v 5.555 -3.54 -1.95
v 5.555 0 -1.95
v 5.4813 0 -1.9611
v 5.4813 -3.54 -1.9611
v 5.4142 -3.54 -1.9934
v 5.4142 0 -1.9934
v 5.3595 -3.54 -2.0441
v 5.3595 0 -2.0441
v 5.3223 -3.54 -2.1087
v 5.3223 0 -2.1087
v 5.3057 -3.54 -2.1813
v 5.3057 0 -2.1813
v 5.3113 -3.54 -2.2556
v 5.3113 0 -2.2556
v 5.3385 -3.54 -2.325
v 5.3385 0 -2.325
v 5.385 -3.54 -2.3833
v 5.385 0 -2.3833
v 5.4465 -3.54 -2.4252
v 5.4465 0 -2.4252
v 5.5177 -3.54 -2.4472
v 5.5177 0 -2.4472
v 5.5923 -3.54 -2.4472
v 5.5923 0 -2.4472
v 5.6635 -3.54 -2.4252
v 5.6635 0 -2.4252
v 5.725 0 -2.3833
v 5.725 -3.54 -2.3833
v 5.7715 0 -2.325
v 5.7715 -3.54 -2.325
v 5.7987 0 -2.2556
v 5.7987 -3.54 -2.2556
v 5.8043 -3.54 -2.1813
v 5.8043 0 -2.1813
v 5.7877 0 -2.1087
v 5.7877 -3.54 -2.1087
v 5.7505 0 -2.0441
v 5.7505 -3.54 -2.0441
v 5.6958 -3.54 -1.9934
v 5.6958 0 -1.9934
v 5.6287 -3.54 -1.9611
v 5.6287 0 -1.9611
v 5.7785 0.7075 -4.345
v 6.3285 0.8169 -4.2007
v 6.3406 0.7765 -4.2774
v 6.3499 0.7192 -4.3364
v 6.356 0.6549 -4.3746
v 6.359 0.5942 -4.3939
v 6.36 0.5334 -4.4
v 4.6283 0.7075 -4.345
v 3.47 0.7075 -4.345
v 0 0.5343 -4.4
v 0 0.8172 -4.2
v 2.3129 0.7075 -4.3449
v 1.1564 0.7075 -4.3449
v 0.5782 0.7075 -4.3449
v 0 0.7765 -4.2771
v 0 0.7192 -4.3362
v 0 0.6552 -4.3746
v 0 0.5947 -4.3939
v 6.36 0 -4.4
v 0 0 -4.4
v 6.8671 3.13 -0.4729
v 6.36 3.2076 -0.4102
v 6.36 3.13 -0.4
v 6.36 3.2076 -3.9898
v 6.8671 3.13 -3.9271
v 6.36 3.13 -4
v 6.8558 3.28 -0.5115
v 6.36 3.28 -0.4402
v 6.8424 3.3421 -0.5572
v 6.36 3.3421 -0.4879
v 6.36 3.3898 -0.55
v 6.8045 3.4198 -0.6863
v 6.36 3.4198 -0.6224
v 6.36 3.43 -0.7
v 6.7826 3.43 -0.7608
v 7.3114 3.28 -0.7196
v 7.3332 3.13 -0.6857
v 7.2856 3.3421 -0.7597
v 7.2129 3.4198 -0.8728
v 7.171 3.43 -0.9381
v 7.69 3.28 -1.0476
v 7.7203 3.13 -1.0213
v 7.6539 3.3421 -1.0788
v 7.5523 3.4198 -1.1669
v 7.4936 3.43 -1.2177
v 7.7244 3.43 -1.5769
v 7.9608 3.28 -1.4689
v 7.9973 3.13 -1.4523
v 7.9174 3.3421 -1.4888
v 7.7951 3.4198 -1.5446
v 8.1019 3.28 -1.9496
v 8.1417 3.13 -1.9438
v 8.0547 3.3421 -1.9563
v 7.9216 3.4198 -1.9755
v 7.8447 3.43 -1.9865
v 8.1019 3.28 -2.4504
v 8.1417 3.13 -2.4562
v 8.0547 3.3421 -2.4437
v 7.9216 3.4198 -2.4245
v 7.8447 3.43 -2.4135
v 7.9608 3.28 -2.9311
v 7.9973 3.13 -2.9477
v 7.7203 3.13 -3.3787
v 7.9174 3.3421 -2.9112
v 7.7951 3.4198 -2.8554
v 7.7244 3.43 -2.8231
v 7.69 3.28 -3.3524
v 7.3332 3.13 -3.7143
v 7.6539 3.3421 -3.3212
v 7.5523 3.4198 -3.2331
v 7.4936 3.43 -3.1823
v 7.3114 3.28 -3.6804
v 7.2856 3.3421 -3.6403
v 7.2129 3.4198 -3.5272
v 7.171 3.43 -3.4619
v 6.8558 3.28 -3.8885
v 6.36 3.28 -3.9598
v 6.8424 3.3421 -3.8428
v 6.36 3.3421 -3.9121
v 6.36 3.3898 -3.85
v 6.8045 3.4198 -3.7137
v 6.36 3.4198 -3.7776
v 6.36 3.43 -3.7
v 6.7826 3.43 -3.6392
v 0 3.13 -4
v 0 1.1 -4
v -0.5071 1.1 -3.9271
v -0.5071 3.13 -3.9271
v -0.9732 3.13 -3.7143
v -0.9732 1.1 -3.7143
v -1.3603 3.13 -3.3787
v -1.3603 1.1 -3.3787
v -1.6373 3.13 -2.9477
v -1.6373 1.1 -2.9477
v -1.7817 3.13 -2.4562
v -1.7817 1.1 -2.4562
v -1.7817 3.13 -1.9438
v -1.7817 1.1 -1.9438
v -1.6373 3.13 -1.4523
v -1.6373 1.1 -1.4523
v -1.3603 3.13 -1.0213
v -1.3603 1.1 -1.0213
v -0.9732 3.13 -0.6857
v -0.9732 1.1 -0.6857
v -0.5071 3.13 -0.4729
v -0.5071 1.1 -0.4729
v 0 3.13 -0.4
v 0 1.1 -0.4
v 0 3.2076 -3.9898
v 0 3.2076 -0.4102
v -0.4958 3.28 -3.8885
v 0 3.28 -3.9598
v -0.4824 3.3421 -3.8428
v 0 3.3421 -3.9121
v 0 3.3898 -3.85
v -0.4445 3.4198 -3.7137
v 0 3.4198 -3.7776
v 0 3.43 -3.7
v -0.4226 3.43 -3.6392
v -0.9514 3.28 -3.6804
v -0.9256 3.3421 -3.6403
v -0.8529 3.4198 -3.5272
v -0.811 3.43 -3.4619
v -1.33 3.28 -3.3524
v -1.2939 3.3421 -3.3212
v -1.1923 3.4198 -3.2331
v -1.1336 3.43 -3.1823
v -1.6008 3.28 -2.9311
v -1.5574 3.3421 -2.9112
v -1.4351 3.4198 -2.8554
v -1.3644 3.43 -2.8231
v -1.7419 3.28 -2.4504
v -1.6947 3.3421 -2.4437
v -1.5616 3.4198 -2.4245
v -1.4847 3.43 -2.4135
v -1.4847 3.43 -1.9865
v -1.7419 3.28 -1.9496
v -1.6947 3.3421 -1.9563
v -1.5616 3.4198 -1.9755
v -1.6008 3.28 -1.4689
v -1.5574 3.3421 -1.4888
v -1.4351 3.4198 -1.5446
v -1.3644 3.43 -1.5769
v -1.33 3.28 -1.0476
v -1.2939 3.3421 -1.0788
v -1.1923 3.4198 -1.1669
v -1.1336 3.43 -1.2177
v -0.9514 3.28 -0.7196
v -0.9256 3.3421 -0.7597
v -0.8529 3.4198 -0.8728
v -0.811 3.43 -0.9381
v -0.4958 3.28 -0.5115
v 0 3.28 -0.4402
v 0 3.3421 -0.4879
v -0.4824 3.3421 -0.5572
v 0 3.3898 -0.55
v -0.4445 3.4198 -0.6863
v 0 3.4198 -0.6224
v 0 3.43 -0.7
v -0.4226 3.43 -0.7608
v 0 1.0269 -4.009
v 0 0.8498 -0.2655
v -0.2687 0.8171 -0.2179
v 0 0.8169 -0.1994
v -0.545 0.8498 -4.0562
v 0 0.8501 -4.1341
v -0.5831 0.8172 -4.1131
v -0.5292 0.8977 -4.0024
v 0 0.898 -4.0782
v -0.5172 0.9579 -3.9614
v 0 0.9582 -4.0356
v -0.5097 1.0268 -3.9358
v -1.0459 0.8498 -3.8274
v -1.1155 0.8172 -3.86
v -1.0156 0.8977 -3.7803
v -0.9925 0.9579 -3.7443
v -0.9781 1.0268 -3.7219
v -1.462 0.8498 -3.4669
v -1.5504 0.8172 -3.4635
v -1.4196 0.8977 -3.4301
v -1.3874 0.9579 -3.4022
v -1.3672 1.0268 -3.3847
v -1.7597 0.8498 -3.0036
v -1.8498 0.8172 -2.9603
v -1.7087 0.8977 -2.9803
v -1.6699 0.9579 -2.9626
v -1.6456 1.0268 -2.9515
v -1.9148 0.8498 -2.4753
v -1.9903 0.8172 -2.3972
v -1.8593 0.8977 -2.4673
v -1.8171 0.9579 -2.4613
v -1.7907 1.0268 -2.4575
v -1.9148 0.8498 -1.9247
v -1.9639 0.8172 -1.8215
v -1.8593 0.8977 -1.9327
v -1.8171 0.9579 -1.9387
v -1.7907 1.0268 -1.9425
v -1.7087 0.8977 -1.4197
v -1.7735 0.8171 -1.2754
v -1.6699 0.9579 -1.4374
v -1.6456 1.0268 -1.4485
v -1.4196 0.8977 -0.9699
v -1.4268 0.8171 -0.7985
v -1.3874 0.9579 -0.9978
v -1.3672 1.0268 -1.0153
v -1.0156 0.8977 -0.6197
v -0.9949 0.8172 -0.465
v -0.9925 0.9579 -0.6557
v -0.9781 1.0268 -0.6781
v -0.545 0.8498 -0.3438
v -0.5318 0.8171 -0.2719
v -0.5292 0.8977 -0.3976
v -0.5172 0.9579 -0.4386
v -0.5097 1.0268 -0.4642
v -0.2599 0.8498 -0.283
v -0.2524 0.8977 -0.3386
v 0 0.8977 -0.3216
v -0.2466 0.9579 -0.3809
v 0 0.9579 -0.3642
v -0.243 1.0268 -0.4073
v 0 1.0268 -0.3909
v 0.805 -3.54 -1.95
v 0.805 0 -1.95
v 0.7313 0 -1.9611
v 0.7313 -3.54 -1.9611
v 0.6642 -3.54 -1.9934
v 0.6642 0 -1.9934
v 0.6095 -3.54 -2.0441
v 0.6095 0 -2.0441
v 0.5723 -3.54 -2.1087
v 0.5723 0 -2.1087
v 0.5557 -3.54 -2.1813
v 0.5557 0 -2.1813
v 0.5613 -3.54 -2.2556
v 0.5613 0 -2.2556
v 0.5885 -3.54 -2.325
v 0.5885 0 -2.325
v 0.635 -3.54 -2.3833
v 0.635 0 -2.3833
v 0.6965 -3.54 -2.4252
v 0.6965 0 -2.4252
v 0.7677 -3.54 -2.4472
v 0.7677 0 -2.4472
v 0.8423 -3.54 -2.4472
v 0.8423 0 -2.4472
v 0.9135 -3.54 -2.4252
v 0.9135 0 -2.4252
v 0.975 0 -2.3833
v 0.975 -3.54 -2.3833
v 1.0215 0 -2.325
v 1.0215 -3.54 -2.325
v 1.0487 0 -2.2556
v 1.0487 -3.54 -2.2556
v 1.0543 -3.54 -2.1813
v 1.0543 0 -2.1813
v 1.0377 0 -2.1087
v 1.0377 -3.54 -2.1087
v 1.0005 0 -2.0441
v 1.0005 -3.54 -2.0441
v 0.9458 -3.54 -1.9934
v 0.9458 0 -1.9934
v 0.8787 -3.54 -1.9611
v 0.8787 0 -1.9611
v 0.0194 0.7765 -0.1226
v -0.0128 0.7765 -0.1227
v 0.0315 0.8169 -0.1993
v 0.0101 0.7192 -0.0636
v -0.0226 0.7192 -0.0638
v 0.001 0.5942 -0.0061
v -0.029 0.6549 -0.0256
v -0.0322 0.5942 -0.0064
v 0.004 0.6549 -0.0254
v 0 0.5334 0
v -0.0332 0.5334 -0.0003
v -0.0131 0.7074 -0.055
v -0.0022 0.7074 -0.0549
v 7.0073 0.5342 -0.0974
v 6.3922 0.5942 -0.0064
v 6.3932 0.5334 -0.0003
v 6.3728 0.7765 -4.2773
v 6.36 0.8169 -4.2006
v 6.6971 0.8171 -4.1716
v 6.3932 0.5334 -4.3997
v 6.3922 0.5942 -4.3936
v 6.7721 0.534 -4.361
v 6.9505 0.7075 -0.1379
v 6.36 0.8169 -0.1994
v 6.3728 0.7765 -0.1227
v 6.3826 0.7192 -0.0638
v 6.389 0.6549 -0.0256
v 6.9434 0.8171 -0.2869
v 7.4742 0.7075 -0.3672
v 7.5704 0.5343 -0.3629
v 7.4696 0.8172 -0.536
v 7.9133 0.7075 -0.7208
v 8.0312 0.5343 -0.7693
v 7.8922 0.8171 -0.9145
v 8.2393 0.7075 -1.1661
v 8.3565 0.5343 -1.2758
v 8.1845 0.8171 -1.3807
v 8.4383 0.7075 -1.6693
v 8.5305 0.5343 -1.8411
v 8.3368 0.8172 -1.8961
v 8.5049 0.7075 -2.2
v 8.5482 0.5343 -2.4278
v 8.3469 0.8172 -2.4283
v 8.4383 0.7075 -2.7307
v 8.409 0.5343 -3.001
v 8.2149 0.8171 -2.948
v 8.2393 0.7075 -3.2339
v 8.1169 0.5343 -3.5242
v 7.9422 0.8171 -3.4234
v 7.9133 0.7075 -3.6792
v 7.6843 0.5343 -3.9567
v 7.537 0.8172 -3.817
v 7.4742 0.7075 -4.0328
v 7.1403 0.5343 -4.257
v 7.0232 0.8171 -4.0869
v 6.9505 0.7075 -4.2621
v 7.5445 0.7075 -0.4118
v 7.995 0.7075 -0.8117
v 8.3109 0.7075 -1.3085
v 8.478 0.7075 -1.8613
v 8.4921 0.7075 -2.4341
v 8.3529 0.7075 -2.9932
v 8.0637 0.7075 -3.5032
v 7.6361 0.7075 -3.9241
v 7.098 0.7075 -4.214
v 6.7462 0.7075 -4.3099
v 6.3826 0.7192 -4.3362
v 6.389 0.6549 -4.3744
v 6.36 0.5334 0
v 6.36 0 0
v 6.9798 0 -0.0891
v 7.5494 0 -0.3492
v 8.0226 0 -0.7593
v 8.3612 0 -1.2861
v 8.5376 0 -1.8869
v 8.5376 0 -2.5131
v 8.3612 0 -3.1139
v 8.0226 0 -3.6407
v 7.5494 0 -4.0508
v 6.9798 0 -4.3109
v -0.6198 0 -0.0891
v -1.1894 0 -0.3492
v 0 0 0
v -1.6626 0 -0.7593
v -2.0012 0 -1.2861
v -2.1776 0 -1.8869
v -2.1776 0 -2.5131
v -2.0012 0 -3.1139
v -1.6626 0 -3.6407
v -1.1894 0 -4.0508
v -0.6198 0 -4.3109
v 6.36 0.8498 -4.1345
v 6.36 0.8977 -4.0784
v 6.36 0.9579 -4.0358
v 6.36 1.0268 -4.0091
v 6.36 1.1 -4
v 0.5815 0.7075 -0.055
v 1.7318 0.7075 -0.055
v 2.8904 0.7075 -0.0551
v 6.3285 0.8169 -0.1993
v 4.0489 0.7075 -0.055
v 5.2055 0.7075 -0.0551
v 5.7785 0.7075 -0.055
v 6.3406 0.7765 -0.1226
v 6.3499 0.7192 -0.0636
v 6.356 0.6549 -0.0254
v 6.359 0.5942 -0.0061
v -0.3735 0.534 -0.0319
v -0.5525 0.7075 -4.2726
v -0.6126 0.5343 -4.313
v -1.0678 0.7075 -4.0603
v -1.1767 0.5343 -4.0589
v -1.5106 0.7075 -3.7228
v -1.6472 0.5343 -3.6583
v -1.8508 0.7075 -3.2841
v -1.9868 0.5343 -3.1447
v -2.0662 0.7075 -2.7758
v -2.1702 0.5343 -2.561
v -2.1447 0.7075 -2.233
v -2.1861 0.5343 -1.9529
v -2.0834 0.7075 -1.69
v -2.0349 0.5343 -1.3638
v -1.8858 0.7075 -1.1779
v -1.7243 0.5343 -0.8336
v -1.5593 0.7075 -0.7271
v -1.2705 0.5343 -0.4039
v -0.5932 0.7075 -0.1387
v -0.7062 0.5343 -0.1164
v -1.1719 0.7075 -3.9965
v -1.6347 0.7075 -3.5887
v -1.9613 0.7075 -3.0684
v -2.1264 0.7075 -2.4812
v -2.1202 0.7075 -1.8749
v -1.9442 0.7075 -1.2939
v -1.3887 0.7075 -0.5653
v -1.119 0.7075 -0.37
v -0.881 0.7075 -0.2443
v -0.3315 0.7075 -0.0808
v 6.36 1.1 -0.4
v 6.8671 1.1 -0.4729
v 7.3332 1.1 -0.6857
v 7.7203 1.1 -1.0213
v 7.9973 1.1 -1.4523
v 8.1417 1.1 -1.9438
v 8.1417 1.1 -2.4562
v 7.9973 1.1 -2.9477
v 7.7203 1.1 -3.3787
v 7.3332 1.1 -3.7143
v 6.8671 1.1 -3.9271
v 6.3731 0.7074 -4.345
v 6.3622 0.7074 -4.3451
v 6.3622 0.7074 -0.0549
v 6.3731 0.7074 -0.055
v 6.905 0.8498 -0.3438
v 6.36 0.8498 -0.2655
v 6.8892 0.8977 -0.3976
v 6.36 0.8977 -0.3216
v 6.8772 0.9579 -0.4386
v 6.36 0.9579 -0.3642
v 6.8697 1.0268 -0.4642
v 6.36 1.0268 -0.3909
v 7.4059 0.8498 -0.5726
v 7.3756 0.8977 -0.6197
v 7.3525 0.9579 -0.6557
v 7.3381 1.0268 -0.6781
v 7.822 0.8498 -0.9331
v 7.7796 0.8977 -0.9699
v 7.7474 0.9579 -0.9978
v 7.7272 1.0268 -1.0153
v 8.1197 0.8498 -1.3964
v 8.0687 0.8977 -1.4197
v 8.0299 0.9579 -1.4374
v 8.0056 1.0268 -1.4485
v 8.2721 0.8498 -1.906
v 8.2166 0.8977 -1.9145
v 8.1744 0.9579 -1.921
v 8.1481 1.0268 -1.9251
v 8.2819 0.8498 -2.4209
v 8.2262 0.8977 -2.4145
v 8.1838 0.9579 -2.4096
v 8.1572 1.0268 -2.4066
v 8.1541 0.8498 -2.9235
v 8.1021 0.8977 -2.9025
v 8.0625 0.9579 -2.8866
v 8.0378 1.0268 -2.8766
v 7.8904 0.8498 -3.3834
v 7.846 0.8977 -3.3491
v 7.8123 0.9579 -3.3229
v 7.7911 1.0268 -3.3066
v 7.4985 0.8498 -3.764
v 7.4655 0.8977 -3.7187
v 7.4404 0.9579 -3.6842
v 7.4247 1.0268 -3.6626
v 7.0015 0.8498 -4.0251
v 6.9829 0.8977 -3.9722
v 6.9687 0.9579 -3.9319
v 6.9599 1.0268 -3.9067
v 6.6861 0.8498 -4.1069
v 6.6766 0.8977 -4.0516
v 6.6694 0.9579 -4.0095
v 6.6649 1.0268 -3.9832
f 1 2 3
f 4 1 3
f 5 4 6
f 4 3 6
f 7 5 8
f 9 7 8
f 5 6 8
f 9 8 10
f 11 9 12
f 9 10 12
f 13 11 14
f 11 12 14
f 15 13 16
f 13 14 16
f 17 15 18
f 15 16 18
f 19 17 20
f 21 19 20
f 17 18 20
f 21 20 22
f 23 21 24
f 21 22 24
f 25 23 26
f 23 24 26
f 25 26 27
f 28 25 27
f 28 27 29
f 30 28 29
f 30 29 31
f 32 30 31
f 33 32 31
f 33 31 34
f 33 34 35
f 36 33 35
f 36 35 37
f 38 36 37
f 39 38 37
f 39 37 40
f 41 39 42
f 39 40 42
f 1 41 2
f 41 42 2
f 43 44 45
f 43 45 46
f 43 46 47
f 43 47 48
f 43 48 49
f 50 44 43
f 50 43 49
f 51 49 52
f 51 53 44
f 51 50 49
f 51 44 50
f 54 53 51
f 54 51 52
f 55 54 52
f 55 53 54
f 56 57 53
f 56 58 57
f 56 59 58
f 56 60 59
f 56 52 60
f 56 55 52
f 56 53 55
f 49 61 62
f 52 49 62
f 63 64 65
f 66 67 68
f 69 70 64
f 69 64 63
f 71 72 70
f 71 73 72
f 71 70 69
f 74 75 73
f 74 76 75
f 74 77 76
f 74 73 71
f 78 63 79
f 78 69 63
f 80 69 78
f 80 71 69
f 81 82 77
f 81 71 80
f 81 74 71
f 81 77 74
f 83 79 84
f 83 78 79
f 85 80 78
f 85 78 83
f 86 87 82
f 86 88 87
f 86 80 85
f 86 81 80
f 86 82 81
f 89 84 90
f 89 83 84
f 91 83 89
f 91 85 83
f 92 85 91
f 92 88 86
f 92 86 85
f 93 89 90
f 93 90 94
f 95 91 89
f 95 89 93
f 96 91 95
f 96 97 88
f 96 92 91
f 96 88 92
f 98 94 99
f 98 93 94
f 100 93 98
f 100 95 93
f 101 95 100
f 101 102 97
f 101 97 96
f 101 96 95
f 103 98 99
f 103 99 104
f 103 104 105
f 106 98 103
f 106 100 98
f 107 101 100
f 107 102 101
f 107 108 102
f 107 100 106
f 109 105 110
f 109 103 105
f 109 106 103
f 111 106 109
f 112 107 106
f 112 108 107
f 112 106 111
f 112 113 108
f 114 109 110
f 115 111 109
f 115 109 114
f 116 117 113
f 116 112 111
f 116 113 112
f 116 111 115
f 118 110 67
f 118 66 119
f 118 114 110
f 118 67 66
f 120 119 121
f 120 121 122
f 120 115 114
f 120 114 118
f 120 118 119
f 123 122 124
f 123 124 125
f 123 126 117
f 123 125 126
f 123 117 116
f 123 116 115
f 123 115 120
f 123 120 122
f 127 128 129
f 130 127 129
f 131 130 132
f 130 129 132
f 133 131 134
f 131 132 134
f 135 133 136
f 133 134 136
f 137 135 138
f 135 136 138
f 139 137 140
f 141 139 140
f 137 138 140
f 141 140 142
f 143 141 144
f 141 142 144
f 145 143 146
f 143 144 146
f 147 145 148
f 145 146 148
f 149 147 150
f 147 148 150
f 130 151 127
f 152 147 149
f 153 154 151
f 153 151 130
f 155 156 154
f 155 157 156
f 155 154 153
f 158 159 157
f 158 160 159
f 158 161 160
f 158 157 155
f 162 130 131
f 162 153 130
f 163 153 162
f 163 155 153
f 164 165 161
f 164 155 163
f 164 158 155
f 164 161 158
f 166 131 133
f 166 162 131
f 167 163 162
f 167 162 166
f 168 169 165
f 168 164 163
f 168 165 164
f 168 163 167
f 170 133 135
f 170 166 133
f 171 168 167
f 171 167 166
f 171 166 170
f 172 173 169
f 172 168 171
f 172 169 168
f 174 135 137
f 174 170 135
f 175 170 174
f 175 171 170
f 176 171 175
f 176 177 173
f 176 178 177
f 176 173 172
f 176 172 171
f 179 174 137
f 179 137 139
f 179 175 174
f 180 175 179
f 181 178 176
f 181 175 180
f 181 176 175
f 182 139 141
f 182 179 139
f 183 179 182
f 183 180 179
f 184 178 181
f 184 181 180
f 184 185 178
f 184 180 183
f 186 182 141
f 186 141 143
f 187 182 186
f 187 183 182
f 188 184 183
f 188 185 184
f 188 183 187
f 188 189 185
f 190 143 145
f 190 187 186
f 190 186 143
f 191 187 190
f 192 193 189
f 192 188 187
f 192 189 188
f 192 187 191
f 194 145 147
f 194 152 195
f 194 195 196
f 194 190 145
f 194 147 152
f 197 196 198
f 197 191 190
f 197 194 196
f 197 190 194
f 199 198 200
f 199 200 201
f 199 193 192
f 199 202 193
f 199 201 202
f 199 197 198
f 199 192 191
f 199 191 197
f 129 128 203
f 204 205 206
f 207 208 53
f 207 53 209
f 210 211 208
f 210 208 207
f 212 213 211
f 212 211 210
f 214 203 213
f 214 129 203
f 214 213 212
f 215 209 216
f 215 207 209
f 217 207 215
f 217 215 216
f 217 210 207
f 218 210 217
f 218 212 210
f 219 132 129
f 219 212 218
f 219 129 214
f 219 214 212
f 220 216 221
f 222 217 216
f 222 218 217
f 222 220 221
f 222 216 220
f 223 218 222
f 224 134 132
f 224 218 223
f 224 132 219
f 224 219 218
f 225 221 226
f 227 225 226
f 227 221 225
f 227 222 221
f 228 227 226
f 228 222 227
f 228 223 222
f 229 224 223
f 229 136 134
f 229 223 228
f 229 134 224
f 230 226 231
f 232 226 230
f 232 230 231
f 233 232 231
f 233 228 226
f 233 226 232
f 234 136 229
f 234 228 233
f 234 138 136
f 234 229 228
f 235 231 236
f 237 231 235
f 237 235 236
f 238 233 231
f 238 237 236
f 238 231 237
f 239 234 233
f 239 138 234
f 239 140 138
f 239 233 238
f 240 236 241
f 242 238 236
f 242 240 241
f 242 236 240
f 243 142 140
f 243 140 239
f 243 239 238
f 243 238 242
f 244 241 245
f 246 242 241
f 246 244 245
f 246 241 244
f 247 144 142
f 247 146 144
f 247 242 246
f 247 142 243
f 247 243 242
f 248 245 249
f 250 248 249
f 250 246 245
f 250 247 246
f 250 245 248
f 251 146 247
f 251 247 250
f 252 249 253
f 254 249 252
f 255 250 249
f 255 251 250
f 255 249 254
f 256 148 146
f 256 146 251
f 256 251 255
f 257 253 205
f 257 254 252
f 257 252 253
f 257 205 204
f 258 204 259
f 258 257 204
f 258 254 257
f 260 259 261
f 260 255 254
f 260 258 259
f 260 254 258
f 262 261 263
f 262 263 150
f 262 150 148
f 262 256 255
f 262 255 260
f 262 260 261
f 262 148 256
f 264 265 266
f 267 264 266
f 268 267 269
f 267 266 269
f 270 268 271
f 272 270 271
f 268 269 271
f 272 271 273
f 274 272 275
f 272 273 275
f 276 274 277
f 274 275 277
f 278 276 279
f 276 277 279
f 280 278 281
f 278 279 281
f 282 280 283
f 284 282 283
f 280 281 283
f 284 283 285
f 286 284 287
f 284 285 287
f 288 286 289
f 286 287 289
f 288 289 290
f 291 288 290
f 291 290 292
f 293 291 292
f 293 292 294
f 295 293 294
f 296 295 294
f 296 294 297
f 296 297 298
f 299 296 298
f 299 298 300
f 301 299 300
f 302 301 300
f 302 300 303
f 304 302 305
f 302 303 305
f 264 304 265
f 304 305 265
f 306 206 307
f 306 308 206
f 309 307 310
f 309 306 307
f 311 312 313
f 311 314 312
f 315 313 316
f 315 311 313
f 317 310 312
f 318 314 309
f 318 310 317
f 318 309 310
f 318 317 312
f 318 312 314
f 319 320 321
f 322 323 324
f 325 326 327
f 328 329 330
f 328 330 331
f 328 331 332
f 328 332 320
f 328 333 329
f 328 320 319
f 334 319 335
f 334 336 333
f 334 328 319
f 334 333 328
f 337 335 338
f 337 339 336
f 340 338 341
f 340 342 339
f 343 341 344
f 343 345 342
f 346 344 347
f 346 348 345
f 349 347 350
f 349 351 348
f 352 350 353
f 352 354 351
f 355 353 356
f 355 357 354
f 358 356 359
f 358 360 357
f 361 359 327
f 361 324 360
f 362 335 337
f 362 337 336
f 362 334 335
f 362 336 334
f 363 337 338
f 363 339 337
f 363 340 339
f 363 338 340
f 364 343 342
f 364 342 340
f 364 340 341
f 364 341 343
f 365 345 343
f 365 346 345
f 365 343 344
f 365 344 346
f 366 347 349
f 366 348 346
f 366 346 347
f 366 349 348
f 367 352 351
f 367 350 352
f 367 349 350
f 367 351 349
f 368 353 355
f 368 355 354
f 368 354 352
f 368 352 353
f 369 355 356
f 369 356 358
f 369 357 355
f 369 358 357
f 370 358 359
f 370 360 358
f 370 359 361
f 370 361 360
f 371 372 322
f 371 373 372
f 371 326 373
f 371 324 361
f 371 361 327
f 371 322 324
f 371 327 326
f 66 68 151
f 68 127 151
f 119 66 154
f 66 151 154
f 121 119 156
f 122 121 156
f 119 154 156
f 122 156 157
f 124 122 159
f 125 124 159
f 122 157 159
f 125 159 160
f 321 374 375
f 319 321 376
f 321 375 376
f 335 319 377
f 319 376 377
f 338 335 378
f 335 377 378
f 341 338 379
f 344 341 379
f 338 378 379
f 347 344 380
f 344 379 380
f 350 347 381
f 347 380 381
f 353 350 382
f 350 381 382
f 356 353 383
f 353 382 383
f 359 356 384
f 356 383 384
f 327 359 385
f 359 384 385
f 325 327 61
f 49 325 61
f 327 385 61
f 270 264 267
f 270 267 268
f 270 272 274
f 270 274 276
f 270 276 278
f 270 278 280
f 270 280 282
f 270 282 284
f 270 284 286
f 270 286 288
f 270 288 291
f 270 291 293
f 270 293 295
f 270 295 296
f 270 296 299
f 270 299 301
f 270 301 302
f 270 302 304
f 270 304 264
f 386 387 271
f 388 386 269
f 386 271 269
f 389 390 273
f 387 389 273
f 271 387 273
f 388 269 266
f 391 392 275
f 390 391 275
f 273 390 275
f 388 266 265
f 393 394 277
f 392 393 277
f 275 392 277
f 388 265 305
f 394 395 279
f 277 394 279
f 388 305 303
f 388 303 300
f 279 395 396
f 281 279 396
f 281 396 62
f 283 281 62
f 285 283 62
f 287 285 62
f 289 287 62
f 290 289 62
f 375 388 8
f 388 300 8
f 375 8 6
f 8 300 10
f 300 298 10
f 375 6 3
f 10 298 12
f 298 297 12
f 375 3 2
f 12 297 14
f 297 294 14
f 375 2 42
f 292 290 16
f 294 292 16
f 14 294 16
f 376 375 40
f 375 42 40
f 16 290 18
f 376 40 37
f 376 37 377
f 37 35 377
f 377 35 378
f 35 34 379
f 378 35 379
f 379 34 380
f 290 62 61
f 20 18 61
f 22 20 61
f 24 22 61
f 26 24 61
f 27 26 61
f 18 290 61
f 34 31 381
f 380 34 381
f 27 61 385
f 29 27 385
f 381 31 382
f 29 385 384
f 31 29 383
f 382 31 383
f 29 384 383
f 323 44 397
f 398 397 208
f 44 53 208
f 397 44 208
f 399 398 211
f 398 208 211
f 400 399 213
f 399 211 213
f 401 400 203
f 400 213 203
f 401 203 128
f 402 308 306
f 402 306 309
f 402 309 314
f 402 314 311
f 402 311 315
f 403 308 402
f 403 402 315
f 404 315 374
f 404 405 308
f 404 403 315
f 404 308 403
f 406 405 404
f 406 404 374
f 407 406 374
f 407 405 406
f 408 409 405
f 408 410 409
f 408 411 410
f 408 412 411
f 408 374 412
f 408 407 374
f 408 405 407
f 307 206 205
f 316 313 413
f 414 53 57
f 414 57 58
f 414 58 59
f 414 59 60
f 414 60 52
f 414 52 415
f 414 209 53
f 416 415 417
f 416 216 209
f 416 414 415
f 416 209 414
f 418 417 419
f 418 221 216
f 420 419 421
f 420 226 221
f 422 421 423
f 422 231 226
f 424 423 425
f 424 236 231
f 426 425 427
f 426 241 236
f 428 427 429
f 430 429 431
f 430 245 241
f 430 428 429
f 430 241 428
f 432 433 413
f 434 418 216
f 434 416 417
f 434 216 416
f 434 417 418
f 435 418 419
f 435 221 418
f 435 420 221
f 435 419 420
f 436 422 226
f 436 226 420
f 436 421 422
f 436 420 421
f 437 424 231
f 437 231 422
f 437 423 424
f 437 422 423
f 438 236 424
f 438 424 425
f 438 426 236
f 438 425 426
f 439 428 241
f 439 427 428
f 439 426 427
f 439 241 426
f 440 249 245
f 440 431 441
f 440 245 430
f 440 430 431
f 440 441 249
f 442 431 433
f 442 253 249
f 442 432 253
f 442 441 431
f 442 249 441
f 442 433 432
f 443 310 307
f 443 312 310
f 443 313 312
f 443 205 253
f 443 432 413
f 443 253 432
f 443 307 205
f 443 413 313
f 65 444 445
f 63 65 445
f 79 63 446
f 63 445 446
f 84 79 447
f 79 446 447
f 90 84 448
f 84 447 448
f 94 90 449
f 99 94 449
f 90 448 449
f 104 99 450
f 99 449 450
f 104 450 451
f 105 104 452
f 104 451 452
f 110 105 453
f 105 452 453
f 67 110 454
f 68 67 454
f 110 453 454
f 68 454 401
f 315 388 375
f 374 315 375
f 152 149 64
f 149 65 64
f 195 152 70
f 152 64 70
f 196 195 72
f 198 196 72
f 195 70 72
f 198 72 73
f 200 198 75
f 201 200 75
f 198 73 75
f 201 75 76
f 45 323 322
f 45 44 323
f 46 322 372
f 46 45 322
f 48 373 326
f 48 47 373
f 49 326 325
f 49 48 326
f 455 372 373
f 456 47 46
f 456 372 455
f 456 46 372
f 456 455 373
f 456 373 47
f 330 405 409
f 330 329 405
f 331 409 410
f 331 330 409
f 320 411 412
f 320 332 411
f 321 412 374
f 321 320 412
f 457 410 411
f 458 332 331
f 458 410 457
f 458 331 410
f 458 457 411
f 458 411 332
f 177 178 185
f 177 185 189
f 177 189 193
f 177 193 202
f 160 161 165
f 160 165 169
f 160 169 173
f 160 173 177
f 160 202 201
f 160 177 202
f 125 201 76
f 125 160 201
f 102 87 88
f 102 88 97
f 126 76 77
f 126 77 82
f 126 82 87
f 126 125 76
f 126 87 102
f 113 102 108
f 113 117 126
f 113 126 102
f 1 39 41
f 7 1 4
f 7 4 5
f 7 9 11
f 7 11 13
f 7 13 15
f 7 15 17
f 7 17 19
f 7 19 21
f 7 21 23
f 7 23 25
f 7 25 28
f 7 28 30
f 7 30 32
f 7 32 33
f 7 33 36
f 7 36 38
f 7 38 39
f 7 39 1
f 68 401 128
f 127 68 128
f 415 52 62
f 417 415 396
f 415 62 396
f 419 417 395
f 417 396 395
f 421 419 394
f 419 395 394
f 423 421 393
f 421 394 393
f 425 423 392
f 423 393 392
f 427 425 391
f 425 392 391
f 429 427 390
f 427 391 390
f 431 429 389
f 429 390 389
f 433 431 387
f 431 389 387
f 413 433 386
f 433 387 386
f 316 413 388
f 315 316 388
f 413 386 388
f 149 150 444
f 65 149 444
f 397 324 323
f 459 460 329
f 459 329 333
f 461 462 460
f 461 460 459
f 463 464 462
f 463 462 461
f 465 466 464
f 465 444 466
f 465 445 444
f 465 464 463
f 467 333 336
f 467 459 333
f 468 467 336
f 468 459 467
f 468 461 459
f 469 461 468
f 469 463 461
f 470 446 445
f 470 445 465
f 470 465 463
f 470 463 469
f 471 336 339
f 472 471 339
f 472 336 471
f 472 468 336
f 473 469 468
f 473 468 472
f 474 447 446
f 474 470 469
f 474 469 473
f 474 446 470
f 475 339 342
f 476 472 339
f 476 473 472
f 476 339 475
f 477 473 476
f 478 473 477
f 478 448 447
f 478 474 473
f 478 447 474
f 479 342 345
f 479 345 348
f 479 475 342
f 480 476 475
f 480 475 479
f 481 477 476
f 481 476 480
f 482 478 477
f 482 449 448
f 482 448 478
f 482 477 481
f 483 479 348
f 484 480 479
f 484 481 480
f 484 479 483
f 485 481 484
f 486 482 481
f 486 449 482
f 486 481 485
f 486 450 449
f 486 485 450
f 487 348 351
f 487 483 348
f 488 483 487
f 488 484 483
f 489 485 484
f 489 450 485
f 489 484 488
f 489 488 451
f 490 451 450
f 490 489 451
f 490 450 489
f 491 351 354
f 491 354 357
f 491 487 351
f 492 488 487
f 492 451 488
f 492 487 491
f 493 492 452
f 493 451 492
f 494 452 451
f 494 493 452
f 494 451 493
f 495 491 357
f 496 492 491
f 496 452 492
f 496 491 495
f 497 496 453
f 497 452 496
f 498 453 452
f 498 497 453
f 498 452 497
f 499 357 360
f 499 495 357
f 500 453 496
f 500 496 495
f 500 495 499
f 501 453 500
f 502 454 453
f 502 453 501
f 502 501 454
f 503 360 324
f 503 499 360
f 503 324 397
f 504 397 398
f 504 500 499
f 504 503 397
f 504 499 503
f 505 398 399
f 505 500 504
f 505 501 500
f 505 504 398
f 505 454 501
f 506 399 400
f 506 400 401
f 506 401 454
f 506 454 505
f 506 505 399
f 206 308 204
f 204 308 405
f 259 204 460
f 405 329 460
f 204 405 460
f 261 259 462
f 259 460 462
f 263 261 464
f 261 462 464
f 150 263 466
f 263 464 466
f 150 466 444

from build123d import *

# Parameters (mm, degrees)
SALIENTE_EXTRUIR1_DEPTH = 3.43
SALIENTE_EXTRUIR2_DEPTH = 0.8
REDONDEO2_R             = 0.3
REDONDEO5_R             = 0.3
CROQUIS2_R              = 0.25
SALIENTE_EXTRUIR3_DEPTH = 3.54


with BuildPart() as part:
    # Croquis1 → Saliente-Extruir1 (new body)
    with BuildSketch(Plane(origin=(0, 0, 0), x_dir=(1, 0, 0), z_dir=(0, 1, 0))):
        with BuildLine():
            Line((0, 0.4), (6.36, 0.4))
            ThreePointArc((6.36, 0.4), (8.16, 2.2), (6.36, 4))
            Line((6.36, 4), (0, 4))
            ThreePointArc((0, 4), (-1.8, 2.2), (0, 0.4))
        make_face()
    extrude(amount=SALIENTE_EXTRUIR1_DEPTH)

    # Croquis1<3> → Saliente-Extruir2 (add)
    with BuildSketch(Plane(origin=(0, 0, 0), x_dir=(1, 0, 0), z_dir=(0, 1, 0))):
        with BuildLine():
            Line((0, 0), (6.36, 0))
            ThreePointArc((6.36, 0), (8.56, 2.2), (6.36, 4.4))
            Line((6.36, 4.4), (0, 4.4))
            ThreePointArc((0, 4.4), (-2.2, 2.2), (0, 0))
        make_face()
        with BuildLine():
            Line((0, 0.4), (6.36, 0.4))
            ThreePointArc((6.36, 0.4), (8.16, 2.2), (6.36, 4))
            Line((6.36, 4), (0, 4))
            ThreePointArc((0, 4), (-1.8, 2.2), (0, 0.4))
        make_face(mode=Mode.SUBTRACT)
    extrude(amount=SALIENTE_EXTRUIR2_DEPTH)

    # Redondeo2
    redondeo2_edges = [part.edges().sort_by_distance(p)[0] for p in [
        (3.18, 3.43, -0.4),
        (8.16, 3.43, -2.2),
        (3.18, 3.43, -4),
        (-1.8, 3.43, -2.2),
        (-1.8, 0.8, -2.2),
        (3.18, 0.8, -4),
        (8.16, 0.8, -2.2),
        (3.18, 0.8, -0.4),
    ]]
    fillet(redondeo2_edges, radius=REDONDEO2_R)

    # Redondeo5
    redondeo5_edges = [part.edges().sort_by_distance(p)[0] for p in [
        (-2.2, 0.8, -2.2),
        (3.18, 0.8, -4.4),
        (8.56, 0.8, -2.2),
        (3.18, 0.8, 0),
    ]]
    fillet(redondeo5_edges, radius=REDONDEO5_R)

    # Croquis2 → Saliente-Extruir3 (add)
    with BuildSketch(Plane.XZ):
        with Locations((0.805, -2.2)):
            Circle(CROQUIS2_R)
        with Locations((5.555, -2.2)):
            Circle(CROQUIS2_R)
    extrude(amount=SALIENTE_EXTRUIR3_DEPTH)


solid = part.part
